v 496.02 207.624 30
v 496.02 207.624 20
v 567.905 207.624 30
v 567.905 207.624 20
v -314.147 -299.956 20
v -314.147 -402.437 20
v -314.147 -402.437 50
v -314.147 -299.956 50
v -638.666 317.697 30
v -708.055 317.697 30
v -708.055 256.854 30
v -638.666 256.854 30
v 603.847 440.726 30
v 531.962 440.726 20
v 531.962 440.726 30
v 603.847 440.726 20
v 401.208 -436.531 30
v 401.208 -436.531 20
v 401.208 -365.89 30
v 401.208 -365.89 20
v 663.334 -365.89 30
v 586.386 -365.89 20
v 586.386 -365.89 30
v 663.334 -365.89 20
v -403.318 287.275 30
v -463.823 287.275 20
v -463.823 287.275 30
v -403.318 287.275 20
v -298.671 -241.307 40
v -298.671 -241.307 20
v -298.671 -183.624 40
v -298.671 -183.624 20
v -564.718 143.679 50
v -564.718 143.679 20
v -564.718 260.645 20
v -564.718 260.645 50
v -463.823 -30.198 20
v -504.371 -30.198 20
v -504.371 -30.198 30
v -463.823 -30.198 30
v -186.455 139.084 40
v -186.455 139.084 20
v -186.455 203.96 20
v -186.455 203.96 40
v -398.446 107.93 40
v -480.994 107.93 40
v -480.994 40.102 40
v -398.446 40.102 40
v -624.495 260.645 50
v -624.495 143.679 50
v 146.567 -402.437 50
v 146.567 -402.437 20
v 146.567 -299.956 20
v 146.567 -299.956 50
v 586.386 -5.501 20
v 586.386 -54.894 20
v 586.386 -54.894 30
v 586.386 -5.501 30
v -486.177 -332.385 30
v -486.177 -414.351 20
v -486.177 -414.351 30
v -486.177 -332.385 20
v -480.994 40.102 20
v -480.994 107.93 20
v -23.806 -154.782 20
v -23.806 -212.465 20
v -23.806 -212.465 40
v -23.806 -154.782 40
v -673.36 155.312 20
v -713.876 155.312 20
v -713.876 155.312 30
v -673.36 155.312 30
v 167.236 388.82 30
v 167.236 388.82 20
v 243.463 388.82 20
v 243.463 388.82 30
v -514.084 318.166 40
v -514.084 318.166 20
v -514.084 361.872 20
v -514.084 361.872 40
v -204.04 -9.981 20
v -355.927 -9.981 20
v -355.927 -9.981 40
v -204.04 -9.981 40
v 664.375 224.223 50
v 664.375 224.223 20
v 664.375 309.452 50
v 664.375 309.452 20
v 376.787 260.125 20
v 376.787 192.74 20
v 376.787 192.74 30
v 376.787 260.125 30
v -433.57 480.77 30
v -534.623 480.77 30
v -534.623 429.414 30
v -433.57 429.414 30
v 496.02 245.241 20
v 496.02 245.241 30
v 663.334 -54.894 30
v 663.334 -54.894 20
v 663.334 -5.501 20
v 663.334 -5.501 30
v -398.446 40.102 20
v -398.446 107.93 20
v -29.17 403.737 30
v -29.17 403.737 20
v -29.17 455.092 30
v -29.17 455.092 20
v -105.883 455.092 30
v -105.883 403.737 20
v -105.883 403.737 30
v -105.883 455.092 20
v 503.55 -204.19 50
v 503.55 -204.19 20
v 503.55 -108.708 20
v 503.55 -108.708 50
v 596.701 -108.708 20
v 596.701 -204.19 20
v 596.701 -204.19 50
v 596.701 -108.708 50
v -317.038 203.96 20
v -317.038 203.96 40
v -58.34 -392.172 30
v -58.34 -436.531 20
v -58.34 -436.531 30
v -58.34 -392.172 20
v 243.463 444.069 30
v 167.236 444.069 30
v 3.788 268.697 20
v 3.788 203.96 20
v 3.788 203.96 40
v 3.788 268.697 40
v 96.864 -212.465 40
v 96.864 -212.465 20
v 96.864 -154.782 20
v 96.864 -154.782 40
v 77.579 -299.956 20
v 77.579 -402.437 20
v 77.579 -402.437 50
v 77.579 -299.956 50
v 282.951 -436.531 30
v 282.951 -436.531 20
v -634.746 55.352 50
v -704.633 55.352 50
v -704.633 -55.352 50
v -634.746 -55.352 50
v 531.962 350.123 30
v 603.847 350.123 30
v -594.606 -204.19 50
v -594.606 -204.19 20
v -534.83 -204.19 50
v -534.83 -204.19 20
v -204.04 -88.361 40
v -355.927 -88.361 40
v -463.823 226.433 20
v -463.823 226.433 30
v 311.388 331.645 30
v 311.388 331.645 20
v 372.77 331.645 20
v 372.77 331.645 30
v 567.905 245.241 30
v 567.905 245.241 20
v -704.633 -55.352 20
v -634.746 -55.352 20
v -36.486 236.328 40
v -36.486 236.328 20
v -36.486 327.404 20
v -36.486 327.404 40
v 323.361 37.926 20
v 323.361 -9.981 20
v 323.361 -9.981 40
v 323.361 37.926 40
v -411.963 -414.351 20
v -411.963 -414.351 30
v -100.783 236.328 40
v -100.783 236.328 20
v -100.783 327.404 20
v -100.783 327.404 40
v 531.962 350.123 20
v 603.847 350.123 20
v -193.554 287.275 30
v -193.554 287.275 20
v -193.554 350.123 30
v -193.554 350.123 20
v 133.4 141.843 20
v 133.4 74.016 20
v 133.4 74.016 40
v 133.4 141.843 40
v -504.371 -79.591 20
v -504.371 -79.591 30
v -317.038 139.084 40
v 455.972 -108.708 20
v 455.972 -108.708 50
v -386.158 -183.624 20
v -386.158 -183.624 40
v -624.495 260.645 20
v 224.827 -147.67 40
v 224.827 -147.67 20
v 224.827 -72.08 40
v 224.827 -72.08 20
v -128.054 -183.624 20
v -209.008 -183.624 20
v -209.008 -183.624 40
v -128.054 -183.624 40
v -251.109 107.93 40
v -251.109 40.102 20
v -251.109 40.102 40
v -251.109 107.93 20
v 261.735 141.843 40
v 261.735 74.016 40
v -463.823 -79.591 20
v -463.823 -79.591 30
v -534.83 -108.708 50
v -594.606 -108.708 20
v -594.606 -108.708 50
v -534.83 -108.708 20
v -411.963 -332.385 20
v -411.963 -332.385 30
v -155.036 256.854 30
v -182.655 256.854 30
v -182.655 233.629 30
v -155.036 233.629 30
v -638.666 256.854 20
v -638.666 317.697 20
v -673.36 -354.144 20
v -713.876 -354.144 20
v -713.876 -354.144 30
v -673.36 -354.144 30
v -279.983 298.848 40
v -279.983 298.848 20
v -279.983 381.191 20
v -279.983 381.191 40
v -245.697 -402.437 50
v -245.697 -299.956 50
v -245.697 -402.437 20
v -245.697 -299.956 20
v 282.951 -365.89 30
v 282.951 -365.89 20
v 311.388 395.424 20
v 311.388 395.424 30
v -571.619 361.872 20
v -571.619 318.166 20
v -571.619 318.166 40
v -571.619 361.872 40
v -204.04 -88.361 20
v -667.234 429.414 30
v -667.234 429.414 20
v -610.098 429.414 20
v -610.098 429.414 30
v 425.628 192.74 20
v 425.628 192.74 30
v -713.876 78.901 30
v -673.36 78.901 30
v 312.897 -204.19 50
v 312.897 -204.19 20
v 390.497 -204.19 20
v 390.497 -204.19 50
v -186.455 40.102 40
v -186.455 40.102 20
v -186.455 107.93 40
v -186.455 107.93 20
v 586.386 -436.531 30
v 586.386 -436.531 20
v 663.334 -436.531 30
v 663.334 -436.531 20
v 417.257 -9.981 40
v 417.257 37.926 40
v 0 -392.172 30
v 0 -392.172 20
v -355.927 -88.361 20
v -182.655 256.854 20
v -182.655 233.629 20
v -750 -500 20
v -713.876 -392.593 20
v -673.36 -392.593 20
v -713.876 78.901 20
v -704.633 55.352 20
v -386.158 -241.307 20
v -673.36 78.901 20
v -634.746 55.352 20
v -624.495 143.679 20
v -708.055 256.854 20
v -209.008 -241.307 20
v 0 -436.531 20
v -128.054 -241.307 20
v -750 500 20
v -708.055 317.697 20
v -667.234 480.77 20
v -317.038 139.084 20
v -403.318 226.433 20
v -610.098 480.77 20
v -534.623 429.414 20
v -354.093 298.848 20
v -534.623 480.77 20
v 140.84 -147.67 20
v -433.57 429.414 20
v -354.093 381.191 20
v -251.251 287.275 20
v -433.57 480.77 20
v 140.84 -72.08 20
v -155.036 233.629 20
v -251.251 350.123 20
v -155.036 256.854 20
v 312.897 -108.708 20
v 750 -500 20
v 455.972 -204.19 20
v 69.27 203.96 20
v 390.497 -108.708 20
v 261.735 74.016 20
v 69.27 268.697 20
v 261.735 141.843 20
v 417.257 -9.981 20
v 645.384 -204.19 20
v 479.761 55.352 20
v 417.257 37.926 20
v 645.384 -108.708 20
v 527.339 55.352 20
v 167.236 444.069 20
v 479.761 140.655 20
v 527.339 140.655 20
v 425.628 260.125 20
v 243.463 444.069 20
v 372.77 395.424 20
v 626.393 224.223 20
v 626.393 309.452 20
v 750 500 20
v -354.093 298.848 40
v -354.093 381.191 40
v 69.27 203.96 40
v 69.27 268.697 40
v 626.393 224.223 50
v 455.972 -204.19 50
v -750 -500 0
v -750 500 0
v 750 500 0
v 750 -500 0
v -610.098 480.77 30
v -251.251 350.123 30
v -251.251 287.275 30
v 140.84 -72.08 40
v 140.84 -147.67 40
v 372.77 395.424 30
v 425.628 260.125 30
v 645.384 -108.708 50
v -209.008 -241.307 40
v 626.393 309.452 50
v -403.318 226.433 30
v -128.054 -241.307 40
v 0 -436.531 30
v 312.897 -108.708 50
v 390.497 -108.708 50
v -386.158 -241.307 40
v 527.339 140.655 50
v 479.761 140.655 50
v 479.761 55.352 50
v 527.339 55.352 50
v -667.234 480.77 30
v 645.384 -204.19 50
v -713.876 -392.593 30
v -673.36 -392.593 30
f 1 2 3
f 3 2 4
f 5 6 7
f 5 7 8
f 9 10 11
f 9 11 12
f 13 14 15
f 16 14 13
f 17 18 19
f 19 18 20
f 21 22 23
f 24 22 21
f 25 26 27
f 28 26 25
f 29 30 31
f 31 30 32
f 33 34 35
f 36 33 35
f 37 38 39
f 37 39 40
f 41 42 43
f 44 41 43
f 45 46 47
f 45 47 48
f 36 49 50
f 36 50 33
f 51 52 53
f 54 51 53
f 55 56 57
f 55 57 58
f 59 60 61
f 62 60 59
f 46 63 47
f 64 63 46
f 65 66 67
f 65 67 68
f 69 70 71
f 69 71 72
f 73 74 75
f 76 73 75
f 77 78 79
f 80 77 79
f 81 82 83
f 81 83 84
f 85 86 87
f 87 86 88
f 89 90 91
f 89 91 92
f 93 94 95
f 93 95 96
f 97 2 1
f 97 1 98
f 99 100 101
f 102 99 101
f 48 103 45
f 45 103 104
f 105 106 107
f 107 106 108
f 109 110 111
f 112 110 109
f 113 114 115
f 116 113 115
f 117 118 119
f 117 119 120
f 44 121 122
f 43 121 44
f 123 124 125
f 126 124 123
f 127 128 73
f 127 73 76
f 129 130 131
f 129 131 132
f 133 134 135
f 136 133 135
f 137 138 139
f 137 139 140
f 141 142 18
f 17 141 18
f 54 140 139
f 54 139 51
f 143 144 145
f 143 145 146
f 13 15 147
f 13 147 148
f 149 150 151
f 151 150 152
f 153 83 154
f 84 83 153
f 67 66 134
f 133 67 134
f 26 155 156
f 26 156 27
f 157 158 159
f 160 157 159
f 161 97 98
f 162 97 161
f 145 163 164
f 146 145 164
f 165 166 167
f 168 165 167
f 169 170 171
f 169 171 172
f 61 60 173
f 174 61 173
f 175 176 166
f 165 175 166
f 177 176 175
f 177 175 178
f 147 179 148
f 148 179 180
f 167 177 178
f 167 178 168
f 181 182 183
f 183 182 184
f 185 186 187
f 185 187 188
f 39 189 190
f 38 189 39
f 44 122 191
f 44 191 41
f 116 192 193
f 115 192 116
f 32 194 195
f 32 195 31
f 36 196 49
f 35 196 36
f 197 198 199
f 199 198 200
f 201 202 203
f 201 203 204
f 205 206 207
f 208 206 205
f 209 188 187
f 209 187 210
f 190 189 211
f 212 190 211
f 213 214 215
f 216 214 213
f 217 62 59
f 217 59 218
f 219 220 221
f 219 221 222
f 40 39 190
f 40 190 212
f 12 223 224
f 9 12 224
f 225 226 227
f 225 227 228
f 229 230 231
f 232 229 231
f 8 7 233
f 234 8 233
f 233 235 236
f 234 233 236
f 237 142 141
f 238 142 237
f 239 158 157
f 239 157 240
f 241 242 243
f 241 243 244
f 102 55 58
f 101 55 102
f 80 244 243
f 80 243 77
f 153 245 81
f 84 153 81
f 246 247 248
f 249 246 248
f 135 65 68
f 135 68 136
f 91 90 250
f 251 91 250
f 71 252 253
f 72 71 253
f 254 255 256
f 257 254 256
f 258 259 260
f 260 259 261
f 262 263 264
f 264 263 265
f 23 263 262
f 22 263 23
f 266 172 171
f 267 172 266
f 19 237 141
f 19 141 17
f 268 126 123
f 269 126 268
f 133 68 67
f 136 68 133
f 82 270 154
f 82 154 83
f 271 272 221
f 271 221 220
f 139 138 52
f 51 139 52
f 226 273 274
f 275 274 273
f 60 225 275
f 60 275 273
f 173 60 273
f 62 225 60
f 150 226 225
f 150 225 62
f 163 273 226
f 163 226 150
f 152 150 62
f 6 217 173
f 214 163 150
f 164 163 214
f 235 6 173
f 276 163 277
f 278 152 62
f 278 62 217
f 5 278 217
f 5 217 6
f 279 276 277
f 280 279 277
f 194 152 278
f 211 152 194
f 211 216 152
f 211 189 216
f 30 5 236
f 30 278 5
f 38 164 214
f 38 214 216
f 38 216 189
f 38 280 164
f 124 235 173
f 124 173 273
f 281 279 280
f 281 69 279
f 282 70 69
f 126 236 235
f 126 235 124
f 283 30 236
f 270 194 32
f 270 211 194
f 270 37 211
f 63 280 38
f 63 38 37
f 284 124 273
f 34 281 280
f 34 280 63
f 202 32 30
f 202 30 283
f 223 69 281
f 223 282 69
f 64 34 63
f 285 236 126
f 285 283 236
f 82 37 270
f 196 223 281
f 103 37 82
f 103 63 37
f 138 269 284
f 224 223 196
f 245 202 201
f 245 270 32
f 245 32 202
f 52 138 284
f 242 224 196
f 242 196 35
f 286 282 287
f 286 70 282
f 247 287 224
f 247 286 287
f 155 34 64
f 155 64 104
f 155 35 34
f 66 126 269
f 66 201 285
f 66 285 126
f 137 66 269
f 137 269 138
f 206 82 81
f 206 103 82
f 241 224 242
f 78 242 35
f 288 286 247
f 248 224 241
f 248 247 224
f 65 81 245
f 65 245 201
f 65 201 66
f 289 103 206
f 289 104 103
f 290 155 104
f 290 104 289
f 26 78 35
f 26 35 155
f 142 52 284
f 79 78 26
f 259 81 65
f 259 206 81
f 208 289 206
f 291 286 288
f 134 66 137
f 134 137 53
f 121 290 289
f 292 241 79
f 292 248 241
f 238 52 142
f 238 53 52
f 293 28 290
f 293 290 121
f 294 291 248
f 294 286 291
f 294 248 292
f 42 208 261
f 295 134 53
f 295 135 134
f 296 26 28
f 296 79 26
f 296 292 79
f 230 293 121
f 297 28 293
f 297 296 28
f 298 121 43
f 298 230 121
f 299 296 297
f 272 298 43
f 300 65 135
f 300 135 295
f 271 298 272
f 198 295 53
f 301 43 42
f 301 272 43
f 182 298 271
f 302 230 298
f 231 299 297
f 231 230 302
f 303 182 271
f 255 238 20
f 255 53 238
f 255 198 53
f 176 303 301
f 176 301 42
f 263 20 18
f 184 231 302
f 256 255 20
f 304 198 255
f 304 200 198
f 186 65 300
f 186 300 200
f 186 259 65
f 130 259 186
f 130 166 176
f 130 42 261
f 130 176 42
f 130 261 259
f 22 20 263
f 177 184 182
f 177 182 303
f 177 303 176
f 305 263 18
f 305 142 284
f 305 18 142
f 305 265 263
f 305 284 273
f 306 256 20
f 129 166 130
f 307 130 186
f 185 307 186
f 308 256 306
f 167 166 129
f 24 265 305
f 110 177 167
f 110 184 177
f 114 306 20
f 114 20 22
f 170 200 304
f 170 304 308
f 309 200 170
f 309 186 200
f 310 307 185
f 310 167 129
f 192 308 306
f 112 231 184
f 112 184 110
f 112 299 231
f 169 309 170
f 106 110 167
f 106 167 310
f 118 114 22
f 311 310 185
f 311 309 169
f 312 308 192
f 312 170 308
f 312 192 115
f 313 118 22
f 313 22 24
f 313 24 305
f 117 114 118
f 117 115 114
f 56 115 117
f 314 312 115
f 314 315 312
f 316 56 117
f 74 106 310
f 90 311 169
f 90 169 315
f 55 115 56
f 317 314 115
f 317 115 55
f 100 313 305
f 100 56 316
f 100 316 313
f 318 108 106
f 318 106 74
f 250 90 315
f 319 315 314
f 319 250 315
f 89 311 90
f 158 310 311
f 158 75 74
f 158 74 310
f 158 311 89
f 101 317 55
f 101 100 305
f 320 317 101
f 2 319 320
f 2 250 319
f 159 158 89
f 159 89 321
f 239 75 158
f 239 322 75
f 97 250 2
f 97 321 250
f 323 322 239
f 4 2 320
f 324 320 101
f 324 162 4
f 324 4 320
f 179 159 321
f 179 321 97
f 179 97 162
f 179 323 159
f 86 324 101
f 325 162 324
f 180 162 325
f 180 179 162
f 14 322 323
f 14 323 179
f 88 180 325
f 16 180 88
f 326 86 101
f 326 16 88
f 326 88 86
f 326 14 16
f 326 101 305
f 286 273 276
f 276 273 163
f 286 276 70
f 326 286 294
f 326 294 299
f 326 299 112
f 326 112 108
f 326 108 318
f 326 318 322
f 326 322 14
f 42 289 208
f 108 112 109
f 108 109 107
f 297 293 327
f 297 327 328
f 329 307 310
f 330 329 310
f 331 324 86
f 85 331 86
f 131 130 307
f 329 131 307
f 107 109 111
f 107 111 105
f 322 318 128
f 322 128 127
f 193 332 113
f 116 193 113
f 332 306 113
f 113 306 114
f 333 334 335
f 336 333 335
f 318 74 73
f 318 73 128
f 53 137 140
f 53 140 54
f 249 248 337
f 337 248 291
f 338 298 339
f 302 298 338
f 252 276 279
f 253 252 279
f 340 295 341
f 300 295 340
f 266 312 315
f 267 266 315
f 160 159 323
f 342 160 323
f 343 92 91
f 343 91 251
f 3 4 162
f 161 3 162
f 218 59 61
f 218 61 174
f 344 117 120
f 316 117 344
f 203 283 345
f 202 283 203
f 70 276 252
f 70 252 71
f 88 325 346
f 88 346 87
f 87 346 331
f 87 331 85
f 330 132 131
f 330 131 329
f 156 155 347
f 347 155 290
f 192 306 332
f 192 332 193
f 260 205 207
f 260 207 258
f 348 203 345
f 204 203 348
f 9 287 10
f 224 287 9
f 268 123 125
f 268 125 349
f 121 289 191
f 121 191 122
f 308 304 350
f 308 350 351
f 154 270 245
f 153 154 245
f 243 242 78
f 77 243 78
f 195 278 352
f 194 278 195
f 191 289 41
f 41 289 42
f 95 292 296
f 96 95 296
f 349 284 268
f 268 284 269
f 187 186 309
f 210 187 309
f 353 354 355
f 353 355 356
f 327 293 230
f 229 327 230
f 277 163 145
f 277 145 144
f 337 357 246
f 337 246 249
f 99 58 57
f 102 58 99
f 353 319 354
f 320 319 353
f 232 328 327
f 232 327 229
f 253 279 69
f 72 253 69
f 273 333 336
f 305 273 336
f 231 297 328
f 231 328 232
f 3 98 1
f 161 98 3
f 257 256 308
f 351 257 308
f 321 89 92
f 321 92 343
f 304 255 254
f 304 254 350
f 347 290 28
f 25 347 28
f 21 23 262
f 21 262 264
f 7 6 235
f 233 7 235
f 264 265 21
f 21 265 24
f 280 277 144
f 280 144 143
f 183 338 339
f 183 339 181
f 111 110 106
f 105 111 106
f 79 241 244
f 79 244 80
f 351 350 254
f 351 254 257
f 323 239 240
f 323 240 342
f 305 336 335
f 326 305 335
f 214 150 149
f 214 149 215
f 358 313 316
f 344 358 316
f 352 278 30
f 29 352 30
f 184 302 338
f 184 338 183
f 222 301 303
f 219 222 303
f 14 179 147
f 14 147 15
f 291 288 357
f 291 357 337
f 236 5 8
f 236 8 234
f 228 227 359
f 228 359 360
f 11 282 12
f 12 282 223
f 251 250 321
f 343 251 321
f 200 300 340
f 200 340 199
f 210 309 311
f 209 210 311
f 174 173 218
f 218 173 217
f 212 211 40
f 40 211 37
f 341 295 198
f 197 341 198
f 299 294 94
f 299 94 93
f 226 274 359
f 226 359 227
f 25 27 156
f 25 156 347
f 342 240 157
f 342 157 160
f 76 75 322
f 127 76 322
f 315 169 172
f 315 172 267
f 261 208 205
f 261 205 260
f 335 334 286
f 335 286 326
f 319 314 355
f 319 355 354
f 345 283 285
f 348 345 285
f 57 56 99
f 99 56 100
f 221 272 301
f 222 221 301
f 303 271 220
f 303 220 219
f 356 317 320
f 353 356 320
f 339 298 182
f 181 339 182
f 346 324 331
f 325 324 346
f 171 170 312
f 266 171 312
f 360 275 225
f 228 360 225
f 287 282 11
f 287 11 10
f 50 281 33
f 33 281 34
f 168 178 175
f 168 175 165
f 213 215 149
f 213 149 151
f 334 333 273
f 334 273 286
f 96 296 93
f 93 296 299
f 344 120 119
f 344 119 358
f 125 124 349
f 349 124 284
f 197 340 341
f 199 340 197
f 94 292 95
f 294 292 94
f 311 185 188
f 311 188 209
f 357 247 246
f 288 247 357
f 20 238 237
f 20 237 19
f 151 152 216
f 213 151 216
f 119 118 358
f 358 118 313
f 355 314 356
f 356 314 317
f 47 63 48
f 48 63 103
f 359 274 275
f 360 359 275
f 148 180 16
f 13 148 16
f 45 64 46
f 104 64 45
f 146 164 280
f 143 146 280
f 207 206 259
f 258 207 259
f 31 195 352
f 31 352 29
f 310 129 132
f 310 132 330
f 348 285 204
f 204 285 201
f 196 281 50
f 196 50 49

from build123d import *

# Parameters (mm, degrees)
SKETCH1_W           = 1500
SKETCH1_H           = 1000
BOSS_EXTRUDE1_DEPTH = 20
SKETCH3_W           = 130.583465718
SKETCH3_H           = 64.876118669
SKETCH3_W_2         = 151.886805153
SKETCH3_H_2         = 78.380013136
SKETCH3_W_3         = 57.534988715
SKETCH3_H_3         = 43.705768465
SKETCH3_W_4         = 74.110334533
SKETCH3_H_4         = 82.34304237
SKETCH3_W_5         = 64.654017388
SKETCH3_H_5         = 67.827502209
SKETCH3_W_6         = 64.297106784
SKETCH3_H_6         = 91.075250697
SKETCH3_W_7         = 65.482001899
SKETCH3_H_7         = 64.736542468
SKETCH3_W_8         = 82.547946155
SKETCH3_W_9         = 87.487408933
SKETCH3_H_8         = 57.683153916
SKETCH3_W_10        = 80.954123825
SKETCH3_W_11        = 120.670239475
SKETCH3_H_9         = 57.683153915
SKETCH3_W_12        = 83.987277467
SKETCH3_H_10        = 75.590177997
SKETCH3_W_13        = 128.335110014
SKETCH3_W_14        = 93.895814637
SKETCH3_H_11        = 47.906584006
BOSS_EXTRUDE3_DEPTH = 20
SKETCH4_W           = 60.505265175
SKETCH4_H           = 60.84282539
SKETCH4_W_2         = 76.713126156
SKETCH4_H_2         = 51.355111613
SKETCH4_W_3         = 57.696310853
SKETCH4_H_3         = 62.84759502
SKETCH4_W_4         = 76.226737233
SKETCH4_H_4         = 55.249628907
SKETCH4_W_5         = 61.382331515
SKETCH4_H_5         = 63.779413286
SKETCH4_W_6         = 71.885005533
SKETCH4_H_6         = 90.602849637
SKETCH4_H_7         = 37.617699495
SKETCH4_W_7         = 48.841078423
SKETCH4_H_8         = 67.384996511
SKETCH4_W_8         = 40.547503332
SKETCH4_H_9         = 49.392814631
SKETCH4_W_9         = 69.389518135
SKETCH4_W_10        = 57.1358405
SKETCH4_H_10        = 51.355111612
SKETCH4_W_11        = 101.052768507
SKETCH4_W_12        = 40.515931739
SKETCH4_H_11        = 76.411004612
SKETCH4_H_12        = 38.449288518
SKETCH4_W_13        = 76.948114593
SKETCH4_H_13        = 70.641085592
SKETCH4_W_14        = 58.340165638
SKETCH4_H_14        = 44.359686403
SKETCH4_W_15        = 74.214557021
SKETCH4_H_15        = 81.96661596
SKETCH4_W_16        = 118.257277251
SKETCH4_H_16        = 49.39281463
SKETCH4_W_17        = 27.61904506
SKETCH4_H_17        = 23.225125894
BOSS_EXTRUDE4_DEPTH = 10
SKETCH5_W           = 69.886820182
SKETCH5_H           = 110.704429614
SKETCH5_W_2         = 59.776457901
SKETCH5_H_2         = 116.965640553
SKETCH5_W_3         = 59.776457902
SKETCH5_H_3         = 95.481603563
SKETCH5_W_4         = 77.599796587
SKETCH5_W_5         = 68.98801997
SKETCH5_H_4         = 102.480565549
SKETCH5_W_6         = 68.449228886
SKETCH5_W_7         = 47.578059456
SKETCH5_H_5         = 85.302800806
SKETCH5_W_8         = 48.683008491
SKETCH5_W_9         = 37.982235028
SKETCH5_H_6         = 85.228197854
BOSS_EXTRUDE5_DEPTH = 30


with BuildPart() as part:
    # Sketch1 → Boss-Extrude1 (new body)
    with BuildSketch(Plane.XY):
        Rectangle(SKETCH1_W, SKETCH1_H)
    extrude(amount=BOSS_EXTRUDE1_DEPTH)

    # Sketch3 → Boss-Extrude3 (add)
    with BuildSketch(Plane.XY.offset(20)):
        with Locations((-251.746581796, 171.52213666)):
            Rectangle(SKETCH3_W, SKETCH3_H)
        with Locations((-279.983147389, -49.170855385)):
            Rectangle(SKETCH3_W_2, SKETCH3_H_2)
        with Locations((-542.851177133, 340.019335173)):
            Rectangle(SKETCH3_W_3, SKETCH3_H_3)
        with Locations((-317.038314656, 340.019335173)):
            Rectangle(SKETCH3_W_4, SKETCH3_H_4)
        with Locations((-218.781857631, 74.01586859)):
            Rectangle(SKETCH3_W_5, SKETCH3_H_5)
        with Locations((-68.634876688, 281.866092578)):
            Rectangle(SKETCH3_W_6, SKETCH3_H_6)
        with Locations((36.529327217, 236.328467229)):
            Rectangle(SKETCH3_W_7, SKETCH3_H_7)
        with Locations((-439.71980811, 74.01586859)):
            Rectangle(SKETCH3_W_8, SKETCH3_H_5)
        with Locations((-342.414495233, -212.465293534)):
            Rectangle(SKETCH3_W_9, SKETCH3_H_8)
        with Locations((-168.530590972, -212.465293534)):
            Rectangle(SKETCH3_W_10, SKETCH3_H_8)
        with Locations((36.529327217, -183.623716577)):
            Rectangle(SKETCH3_W_11, SKETCH3_H_9)
        with Locations((182.83360839, -109.875086681)):
            Rectangle(SKETCH3_W_12, SKETCH3_H_10)
        with Locations((197.567359377, 107.929619695)):
            Rectangle(SKETCH3_W_13, SKETCH3_H_5)
        with Locations((370.308737898, 13.972443186)):
            Rectangle(SKETCH3_W_14, SKETCH3_H_11)
    extrude(amount=BOSS_EXTRUDE3_DEPTH)

    # Sketch4 → Boss-Extrude4 (add)
    with BuildSketch(Plane.XY.offset(20)):
        with Locations((-433.57041273, 256.853926164)):
            Rectangle(SKETCH4_W, SKETCH4_H)
        with Locations((-67.526645897, 429.414434023)):
            Rectangle(SKETCH4_W_2, SKETCH4_H_2)
        with Locations((-222.402612467, 318.699136369)):
            Rectangle(SKETCH4_W_3, SKETCH4_H_3)
        with Locations((205.349756633, 416.444675835)):
            Rectangle(SKETCH4_W_4, SKETCH4_H_4)
        with Locations((342.079165749, 363.534652055)):
            Rectangle(SKETCH4_W_5, SKETCH4_H_5)
        with Locations((567.90495485, 395.424358697)):
            Rectangle(SKETCH4_W_6, SKETCH4_H_6)
        with Locations((531.962452085, 226.43251347)):
            Rectangle(SKETCH4_W_6, SKETCH4_H_7)
        with Locations((401.207804375, 226.43251347)):
            Rectangle(SKETCH4_W_7, SKETCH4_H_8)
        with Locations((-484.096796983, -54.894187693)):
            Rectangle(SKETCH4_W_8, SKETCH4_H_9)
        with Locations((-673.360372997, 287.275338859)):
            Rectangle(SKETCH4_W_9, SKETCH4_H)
        with Locations((-638.665613929, 455.091989829)):
            Rectangle(SKETCH4_W_10, SKETCH4_H_10)
        with Locations((-484.096796983, 455.091989829)):
            Rectangle(SKETCH4_W_11, SKETCH4_H_10)
        with Locations((-693.618338867, 117.106041113)):
            Rectangle(SKETCH4_W_12, SKETCH4_H_11)
        with Locations((-693.618338867, -373.3681612)):
            Rectangle(SKETCH4_W_12, SKETCH4_H_12)
        with Locations((624.860370913, -401.210769585)):
            Rectangle(SKETCH4_W_13, SKETCH4_H_13)
        with Locations((-29.170082819, -414.351469179)):
            Rectangle(SKETCH4_W_14, SKETCH4_H_14)
        with Locations((-449.070136402, -373.3681612)):
            Rectangle(SKETCH4_W_15, SKETCH4_H_15)
        with Locations((342.079165749, -401.210769585)):
            Rectangle(SKETCH4_W_16, SKETCH4_H_13)
        with Locations((624.860370913, -30.197780377)):
            Rectangle(SKETCH4_W_13, SKETCH4_H_16)
        with Locations((-168.845215562, 245.241363217)):
            Rectangle(SKETCH4_W_17, SKETCH4_H_17)
    extrude(amount=BOSS_EXTRUDE4_DEPTH)

    # Sketch5 → Boss-Extrude5 (add)
    with BuildSketch(Plane.XY.offset(20)):
        with Locations((-669.689782814, 0)):
            Rectangle(SKETCH5_W, SKETCH5_H)
        with Locations((-594.606430914, 202.16224879)):
            Rectangle(SKETCH5_W_2, SKETCH5_H_2)
        with Locations((-564.718201963, -156.448979485)):
            Rectangle(SKETCH5_W_3, SKETCH5_H_3)
        with Locations((351.696943904, -156.448979485)):
            Rectangle(SKETCH5_W_4, SKETCH5_H_3)
        with Locations((112.072703345, -351.196361502)):
            Rectangle(SKETCH5_W_5, SKETCH5_H_4)
        with Locations((-279.921964377, -351.196361502)):
            Rectangle(SKETCH5_W_6, SKETCH5_H_4)
        with Locations((503.549963007, 98.00361521)):
            Rectangle(SKETCH5_W_7, SKETCH5_H_5)
        with Locations((479.760933279, -156.448979485)):
            Rectangle(SKETCH5_W_7, SKETCH5_H_3)
        with Locations((621.042297234, -156.448979485)):
            Rectangle(SKETCH5_W_8, SKETCH5_H_3)
        with Locations((645.38380148, 266.83756344)):
            Rectangle(SKETCH5_W_9, SKETCH5_H_6)
    extrude(amount=BOSS_EXTRUDE5_DEPTH)


solid = part.part
